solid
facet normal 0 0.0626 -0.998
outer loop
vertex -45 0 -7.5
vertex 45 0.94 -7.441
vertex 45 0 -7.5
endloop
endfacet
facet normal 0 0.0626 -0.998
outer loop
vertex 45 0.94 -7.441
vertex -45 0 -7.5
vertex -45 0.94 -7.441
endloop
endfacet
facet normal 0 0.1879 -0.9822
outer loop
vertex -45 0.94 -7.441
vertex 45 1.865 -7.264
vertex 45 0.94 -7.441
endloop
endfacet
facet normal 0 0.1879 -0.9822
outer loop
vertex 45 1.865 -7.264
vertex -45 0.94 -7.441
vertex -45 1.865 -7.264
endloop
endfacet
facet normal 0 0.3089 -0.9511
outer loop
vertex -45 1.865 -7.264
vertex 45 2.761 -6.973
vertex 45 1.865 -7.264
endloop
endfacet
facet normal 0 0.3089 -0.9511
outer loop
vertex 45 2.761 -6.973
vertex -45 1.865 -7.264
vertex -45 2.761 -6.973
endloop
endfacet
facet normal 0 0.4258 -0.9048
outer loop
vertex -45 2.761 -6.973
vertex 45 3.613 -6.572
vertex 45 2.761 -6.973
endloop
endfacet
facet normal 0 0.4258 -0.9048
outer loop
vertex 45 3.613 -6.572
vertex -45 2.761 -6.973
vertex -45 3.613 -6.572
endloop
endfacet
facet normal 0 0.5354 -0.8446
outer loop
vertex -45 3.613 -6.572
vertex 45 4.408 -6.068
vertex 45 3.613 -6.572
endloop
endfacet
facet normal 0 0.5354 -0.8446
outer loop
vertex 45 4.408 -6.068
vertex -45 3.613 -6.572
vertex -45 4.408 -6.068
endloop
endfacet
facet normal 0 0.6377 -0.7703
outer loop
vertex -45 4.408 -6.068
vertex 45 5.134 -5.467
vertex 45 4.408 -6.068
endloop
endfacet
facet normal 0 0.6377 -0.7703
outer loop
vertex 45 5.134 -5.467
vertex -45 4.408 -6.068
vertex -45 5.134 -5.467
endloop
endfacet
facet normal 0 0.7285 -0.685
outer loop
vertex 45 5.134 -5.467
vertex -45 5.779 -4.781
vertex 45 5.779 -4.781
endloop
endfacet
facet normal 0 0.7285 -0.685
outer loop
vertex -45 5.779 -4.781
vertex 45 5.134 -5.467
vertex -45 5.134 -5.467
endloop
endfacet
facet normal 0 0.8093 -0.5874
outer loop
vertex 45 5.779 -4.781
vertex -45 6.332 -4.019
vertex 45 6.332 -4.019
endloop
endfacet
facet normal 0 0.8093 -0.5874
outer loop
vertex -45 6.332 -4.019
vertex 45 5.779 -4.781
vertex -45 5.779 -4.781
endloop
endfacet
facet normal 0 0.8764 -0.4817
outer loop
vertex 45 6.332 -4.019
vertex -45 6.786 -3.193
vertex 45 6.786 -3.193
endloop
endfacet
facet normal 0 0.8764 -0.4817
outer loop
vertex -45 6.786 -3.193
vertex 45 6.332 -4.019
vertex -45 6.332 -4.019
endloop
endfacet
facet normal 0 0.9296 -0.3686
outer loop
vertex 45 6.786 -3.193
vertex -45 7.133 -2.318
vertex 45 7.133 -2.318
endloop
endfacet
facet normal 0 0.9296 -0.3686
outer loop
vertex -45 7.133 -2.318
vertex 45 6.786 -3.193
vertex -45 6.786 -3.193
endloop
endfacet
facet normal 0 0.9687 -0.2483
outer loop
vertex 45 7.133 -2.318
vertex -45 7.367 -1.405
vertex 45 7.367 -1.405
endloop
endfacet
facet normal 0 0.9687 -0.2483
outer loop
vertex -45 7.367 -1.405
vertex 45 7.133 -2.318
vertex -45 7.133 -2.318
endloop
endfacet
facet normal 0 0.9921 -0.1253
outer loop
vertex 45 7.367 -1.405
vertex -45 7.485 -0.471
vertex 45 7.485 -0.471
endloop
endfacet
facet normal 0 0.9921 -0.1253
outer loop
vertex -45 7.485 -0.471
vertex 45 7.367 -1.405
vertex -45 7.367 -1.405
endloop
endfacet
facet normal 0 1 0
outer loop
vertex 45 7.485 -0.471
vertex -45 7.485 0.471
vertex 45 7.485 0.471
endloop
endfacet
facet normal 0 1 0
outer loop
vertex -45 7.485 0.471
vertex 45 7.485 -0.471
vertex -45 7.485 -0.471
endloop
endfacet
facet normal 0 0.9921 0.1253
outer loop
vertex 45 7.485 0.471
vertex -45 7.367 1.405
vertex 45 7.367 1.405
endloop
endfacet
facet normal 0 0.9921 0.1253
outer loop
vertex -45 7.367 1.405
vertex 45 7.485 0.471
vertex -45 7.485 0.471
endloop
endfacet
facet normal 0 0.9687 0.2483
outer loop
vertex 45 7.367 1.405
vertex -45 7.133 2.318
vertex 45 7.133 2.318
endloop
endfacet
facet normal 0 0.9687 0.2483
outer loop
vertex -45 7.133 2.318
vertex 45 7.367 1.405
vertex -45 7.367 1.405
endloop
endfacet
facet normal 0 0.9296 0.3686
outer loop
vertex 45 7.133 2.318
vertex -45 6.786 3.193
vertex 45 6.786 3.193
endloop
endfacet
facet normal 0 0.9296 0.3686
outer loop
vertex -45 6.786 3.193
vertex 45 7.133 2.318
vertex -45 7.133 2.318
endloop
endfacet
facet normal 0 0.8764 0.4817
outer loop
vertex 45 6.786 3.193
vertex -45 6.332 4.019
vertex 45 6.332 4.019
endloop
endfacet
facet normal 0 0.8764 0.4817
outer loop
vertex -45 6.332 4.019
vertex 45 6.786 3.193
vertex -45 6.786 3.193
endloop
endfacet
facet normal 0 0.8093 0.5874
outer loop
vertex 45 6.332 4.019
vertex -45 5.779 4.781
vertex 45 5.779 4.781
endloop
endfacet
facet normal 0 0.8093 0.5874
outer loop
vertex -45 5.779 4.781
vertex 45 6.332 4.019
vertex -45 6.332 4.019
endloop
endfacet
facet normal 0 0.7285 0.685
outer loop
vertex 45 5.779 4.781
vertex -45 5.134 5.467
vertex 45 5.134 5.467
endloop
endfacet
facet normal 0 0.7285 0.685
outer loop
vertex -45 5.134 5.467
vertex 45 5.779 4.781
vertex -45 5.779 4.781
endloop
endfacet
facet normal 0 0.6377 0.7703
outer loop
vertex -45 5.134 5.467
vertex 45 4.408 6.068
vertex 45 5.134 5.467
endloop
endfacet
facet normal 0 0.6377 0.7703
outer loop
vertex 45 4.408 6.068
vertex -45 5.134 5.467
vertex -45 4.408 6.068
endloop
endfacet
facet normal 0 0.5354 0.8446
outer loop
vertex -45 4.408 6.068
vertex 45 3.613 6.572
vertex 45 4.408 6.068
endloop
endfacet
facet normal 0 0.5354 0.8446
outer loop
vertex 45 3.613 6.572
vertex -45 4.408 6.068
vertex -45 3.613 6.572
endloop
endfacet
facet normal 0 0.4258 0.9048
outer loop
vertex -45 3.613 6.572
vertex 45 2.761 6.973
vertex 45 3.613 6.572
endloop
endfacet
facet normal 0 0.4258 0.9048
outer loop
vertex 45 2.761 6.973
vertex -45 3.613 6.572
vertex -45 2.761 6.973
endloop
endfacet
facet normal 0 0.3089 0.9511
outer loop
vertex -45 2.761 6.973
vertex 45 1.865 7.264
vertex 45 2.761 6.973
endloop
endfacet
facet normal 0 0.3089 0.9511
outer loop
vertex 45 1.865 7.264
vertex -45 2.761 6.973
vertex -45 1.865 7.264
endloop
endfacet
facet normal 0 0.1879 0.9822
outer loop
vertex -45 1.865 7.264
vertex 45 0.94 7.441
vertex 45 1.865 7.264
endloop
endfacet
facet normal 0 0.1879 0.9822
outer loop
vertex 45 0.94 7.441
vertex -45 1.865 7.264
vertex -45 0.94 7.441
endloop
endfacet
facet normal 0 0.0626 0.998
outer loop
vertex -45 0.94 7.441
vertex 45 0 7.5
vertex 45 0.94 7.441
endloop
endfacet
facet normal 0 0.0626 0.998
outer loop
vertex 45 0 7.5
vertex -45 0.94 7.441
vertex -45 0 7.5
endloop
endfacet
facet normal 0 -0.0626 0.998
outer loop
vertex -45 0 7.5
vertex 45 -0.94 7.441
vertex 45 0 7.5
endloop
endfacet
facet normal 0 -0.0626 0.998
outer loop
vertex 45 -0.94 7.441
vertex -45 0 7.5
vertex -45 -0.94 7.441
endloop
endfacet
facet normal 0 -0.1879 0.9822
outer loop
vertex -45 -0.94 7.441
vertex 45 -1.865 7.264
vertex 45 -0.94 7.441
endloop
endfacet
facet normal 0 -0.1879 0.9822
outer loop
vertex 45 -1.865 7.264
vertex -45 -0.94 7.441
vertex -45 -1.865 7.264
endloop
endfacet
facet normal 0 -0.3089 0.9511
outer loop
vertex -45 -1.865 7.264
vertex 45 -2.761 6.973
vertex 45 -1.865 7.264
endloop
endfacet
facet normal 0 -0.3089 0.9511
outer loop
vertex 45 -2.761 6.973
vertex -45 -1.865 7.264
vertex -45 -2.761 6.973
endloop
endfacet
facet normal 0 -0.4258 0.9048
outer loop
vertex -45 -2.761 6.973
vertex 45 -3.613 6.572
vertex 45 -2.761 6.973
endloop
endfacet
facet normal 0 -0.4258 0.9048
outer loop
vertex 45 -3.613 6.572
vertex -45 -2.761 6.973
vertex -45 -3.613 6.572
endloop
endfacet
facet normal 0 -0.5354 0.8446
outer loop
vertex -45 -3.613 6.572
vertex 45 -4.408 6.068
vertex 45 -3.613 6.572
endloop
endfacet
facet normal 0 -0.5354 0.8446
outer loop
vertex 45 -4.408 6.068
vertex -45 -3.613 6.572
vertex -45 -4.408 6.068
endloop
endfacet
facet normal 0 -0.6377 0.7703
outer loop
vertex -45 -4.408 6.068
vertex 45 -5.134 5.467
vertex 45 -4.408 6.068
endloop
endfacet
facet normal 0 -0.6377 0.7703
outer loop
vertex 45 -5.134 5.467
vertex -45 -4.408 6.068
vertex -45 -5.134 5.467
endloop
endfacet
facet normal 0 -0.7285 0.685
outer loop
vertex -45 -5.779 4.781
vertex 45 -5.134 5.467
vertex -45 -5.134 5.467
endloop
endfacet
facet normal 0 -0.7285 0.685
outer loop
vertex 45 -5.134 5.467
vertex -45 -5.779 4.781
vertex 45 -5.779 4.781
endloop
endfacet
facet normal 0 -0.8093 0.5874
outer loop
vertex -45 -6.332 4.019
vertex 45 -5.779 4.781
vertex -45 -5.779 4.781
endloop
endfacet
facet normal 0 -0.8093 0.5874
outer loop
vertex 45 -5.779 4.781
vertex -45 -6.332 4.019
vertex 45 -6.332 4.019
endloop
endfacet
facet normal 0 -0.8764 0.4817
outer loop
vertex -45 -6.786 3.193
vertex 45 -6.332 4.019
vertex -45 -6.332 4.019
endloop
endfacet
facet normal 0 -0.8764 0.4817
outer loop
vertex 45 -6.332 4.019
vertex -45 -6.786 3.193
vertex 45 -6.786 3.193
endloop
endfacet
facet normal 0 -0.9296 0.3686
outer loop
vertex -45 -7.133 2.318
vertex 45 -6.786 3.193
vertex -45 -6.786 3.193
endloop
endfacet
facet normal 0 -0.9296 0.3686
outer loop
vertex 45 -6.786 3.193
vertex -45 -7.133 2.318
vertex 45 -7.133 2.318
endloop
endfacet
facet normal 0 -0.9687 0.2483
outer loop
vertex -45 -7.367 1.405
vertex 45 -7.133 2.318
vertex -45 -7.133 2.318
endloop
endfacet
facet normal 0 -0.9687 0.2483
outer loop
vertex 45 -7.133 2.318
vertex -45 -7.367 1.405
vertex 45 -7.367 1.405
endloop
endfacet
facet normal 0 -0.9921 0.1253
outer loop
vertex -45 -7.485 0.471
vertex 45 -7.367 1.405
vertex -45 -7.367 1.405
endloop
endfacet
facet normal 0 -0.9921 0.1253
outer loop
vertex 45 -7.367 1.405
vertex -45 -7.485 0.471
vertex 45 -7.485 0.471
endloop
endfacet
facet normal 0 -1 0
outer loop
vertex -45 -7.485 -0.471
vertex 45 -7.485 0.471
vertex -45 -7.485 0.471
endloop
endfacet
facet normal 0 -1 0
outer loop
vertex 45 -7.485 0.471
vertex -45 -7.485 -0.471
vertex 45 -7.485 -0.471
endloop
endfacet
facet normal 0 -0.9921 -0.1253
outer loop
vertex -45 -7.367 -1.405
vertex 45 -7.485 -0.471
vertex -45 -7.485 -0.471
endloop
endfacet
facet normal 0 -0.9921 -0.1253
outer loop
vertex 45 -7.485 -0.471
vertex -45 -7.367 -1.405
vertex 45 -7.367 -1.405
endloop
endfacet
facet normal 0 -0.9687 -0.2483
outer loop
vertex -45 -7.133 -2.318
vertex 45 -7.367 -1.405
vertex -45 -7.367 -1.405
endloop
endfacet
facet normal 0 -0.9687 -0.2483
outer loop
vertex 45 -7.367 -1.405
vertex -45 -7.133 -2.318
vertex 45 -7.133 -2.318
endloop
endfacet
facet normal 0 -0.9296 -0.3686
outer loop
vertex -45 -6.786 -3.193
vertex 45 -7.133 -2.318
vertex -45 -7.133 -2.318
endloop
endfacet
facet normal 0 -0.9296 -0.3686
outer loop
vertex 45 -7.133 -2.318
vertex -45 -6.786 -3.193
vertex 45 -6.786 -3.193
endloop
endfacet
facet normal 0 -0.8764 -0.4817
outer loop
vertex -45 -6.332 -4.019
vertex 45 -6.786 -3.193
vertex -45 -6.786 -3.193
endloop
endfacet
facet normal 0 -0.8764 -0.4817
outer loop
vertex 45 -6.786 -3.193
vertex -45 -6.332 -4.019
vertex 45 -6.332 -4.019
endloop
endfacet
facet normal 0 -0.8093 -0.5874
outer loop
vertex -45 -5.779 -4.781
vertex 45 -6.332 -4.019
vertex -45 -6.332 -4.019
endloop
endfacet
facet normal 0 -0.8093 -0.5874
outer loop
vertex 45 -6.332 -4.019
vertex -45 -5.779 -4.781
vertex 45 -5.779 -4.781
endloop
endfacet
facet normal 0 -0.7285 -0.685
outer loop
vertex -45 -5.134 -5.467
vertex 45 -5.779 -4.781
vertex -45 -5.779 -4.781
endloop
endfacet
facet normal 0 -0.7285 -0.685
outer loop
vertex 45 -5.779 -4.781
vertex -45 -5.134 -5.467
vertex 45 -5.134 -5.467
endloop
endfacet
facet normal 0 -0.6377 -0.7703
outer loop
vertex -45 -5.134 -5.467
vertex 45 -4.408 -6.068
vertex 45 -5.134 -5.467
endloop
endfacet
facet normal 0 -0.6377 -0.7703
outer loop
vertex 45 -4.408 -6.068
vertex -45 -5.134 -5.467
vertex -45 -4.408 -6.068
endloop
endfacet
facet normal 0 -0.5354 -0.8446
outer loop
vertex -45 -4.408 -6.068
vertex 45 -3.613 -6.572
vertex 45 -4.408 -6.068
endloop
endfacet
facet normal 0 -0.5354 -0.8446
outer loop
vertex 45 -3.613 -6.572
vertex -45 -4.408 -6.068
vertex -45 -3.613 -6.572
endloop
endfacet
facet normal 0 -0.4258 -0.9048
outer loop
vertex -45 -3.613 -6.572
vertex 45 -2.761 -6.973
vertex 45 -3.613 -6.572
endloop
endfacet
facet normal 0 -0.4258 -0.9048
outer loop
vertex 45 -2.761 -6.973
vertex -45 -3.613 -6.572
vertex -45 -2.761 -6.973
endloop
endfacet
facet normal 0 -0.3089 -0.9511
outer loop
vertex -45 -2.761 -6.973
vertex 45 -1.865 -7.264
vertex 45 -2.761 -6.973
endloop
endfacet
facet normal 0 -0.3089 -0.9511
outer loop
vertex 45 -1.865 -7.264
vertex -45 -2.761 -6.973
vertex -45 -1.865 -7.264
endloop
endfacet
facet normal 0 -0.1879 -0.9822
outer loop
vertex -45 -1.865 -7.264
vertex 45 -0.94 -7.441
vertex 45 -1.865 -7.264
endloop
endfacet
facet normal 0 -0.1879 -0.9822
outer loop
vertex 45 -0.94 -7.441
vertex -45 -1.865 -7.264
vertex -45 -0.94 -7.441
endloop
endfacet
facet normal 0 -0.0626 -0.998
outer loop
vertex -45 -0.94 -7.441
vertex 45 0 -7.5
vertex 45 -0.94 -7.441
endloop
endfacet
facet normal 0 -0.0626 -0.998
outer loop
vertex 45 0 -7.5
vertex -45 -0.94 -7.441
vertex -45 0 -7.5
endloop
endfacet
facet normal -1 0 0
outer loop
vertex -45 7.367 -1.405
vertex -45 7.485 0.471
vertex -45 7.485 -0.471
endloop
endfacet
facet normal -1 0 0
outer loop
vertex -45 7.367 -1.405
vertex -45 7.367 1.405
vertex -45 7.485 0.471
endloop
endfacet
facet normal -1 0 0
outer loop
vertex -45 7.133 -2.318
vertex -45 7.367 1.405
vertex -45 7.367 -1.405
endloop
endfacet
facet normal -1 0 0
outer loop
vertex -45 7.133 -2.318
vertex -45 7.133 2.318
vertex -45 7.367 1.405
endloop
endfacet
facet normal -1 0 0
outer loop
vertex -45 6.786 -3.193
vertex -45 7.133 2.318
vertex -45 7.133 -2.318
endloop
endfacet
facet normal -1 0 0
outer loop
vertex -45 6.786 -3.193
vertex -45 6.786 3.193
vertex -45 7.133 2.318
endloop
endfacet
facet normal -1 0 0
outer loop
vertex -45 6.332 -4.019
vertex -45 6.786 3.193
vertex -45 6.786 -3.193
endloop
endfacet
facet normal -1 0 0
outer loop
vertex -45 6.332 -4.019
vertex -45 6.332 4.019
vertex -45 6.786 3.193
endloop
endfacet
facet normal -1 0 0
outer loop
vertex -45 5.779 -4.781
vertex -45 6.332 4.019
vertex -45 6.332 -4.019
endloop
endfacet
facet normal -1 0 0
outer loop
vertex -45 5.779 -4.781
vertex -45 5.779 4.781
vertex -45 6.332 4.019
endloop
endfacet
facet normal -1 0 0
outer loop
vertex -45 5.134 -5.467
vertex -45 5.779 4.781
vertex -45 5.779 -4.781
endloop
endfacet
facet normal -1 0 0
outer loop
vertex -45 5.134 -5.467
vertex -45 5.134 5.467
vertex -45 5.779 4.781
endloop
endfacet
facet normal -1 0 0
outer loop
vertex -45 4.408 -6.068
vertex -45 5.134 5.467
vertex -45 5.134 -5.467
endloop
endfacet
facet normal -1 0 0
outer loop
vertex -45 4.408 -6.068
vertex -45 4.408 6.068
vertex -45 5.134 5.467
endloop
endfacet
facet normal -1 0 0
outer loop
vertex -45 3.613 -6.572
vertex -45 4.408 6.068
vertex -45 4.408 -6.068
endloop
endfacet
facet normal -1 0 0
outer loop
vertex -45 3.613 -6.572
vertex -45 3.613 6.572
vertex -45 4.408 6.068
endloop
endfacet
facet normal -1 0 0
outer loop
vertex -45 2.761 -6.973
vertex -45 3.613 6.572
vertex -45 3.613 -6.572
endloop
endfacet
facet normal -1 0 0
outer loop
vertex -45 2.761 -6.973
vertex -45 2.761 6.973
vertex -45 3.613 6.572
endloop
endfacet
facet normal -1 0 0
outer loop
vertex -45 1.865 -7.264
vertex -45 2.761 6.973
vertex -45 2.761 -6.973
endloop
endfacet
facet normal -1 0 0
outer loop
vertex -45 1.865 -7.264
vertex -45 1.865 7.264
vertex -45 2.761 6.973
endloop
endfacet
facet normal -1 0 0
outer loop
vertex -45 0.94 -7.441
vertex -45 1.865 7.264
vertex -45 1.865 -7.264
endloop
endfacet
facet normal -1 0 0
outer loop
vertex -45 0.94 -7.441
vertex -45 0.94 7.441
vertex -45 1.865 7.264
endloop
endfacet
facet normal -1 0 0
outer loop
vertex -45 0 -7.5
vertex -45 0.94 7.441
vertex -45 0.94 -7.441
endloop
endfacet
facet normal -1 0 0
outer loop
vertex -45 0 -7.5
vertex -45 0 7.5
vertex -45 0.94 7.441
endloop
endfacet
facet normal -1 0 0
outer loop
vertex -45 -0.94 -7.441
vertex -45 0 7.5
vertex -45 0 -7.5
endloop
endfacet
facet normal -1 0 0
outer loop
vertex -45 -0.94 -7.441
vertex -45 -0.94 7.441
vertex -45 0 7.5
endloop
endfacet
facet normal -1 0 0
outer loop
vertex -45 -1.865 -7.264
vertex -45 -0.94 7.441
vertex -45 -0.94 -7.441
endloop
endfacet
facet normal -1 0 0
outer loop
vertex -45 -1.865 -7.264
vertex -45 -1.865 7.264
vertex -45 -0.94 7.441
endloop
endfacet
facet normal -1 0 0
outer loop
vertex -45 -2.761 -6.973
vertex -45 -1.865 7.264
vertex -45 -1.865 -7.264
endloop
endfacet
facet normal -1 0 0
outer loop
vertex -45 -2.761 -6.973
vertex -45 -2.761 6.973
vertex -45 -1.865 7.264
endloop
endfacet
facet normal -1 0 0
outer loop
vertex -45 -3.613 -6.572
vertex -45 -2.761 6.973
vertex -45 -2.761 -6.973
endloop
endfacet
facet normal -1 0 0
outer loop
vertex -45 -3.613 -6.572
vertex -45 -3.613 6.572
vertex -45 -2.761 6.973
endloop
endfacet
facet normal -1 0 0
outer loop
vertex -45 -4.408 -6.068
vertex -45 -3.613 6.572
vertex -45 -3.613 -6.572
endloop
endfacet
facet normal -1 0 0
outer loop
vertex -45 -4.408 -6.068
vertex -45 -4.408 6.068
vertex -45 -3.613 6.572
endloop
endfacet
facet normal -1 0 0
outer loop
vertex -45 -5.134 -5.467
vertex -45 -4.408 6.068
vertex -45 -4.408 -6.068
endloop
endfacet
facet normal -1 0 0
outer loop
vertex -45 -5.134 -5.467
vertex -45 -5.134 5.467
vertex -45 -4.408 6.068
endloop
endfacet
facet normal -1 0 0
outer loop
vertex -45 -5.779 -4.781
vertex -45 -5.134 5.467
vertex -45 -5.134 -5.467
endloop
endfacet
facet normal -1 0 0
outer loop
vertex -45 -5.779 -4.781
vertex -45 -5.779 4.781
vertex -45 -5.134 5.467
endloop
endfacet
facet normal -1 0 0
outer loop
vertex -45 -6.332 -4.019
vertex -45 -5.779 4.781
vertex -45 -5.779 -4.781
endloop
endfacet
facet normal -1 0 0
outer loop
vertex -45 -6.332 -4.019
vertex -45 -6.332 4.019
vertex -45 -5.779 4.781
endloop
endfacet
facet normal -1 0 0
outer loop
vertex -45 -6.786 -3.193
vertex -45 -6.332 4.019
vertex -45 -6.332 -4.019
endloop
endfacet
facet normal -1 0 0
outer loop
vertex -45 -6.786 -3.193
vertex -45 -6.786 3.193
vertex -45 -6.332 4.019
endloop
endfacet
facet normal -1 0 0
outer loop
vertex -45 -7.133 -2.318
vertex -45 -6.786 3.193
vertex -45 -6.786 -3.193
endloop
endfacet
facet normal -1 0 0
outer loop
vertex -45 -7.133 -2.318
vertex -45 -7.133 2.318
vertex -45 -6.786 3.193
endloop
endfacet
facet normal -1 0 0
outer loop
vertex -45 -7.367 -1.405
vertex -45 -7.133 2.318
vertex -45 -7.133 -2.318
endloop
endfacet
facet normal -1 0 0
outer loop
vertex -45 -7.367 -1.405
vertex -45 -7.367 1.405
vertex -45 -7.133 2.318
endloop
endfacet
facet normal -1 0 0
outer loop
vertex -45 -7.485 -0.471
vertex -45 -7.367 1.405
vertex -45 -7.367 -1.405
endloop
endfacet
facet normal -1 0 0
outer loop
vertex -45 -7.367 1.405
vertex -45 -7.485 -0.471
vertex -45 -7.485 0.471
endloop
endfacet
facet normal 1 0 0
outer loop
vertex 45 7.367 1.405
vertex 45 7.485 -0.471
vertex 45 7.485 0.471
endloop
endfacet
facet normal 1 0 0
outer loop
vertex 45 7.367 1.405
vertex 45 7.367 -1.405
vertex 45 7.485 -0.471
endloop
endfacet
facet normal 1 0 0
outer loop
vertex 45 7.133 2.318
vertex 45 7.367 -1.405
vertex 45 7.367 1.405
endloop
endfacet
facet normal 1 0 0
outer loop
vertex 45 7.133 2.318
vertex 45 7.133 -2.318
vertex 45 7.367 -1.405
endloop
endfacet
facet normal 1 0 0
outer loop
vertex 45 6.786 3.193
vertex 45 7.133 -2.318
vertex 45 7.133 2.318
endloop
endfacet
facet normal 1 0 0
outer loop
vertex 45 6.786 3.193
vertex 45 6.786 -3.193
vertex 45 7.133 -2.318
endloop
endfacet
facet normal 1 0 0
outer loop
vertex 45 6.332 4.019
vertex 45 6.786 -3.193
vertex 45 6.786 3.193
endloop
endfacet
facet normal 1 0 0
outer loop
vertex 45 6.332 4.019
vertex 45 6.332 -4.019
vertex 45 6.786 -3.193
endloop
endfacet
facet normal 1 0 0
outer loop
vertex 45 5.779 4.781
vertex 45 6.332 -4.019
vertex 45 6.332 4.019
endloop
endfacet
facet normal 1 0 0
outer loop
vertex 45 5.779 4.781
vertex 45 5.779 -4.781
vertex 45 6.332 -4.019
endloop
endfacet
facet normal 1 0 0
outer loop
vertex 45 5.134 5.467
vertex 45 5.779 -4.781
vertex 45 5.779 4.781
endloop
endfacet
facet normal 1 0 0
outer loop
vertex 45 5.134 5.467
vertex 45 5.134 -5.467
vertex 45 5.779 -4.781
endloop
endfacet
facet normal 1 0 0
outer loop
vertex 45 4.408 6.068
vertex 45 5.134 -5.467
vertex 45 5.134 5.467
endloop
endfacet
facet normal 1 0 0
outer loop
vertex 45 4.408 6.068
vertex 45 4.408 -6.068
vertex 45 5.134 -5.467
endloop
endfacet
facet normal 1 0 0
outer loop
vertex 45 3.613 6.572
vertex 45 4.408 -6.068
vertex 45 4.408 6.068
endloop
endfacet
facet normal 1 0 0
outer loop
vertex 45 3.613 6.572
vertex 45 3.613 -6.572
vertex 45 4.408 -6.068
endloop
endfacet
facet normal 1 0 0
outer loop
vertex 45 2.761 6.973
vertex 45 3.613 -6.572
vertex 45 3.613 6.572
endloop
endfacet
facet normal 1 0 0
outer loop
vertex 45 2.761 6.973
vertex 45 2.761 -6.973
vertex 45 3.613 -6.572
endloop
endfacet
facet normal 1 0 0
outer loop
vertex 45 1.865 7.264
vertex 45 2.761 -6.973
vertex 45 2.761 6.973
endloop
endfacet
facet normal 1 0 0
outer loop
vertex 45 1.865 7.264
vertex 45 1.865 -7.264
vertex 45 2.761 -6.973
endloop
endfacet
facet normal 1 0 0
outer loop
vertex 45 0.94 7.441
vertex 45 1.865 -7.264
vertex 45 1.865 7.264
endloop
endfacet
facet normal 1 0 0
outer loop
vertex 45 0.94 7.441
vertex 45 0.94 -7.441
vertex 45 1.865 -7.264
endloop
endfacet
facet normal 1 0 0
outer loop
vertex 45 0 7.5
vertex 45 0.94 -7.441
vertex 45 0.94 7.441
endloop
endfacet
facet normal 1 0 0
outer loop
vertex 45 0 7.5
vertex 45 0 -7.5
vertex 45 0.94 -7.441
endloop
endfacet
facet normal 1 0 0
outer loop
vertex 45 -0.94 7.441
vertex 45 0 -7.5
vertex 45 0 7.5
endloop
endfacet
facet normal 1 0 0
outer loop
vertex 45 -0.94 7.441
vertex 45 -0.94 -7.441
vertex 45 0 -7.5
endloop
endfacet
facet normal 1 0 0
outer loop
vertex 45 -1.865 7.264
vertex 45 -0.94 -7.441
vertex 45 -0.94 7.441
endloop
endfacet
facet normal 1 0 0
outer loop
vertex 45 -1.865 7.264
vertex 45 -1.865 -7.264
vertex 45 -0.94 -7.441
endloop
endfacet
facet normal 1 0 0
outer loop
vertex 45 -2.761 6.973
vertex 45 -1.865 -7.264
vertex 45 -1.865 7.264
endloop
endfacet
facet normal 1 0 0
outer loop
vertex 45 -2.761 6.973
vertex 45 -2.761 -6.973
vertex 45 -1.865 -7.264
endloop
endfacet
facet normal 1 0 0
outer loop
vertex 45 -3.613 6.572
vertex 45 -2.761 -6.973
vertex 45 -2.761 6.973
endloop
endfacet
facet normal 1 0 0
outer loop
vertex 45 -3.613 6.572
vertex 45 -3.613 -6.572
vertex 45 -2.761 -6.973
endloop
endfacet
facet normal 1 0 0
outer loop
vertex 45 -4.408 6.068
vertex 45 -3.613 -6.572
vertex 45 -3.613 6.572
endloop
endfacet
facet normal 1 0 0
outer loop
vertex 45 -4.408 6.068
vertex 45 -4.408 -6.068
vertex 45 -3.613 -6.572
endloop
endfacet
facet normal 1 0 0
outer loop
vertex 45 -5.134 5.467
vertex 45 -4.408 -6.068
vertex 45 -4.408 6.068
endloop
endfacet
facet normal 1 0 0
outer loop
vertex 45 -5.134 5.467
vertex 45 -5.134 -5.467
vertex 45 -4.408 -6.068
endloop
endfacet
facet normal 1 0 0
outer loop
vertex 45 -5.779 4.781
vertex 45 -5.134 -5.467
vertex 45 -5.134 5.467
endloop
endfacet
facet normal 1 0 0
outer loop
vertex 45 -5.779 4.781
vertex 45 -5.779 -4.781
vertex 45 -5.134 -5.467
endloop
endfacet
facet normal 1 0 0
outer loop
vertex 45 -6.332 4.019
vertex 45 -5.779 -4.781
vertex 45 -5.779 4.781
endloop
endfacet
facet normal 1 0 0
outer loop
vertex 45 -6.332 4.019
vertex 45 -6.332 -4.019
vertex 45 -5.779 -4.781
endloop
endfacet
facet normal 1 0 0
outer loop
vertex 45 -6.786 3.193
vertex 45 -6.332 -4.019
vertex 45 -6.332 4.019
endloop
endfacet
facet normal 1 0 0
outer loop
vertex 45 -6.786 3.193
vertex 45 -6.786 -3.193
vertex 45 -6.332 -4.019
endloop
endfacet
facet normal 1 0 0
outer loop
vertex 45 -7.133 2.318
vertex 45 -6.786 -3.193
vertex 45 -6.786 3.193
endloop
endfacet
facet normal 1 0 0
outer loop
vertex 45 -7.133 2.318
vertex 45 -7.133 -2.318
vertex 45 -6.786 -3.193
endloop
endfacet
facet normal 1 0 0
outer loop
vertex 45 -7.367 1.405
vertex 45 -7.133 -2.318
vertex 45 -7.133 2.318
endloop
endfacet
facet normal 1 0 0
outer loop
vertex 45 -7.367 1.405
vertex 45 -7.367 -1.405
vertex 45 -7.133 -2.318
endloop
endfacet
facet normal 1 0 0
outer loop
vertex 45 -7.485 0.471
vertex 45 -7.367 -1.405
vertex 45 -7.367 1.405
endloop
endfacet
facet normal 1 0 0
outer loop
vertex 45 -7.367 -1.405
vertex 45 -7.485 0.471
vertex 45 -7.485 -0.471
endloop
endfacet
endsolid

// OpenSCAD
$fn = 50;

SCREW_LENGTH = 30;
HDF_HEIGHT = 8;
SCREW_DIA = 3;
HANDLE_LENGTH = 90;
HANDLE_CLEARANCE = 30;
HANDLE_DIA = 15;

rotate([0,90,0])cylinder(h = HANDLE_LENGTH, d = HANDLE_DIA, center = true);
